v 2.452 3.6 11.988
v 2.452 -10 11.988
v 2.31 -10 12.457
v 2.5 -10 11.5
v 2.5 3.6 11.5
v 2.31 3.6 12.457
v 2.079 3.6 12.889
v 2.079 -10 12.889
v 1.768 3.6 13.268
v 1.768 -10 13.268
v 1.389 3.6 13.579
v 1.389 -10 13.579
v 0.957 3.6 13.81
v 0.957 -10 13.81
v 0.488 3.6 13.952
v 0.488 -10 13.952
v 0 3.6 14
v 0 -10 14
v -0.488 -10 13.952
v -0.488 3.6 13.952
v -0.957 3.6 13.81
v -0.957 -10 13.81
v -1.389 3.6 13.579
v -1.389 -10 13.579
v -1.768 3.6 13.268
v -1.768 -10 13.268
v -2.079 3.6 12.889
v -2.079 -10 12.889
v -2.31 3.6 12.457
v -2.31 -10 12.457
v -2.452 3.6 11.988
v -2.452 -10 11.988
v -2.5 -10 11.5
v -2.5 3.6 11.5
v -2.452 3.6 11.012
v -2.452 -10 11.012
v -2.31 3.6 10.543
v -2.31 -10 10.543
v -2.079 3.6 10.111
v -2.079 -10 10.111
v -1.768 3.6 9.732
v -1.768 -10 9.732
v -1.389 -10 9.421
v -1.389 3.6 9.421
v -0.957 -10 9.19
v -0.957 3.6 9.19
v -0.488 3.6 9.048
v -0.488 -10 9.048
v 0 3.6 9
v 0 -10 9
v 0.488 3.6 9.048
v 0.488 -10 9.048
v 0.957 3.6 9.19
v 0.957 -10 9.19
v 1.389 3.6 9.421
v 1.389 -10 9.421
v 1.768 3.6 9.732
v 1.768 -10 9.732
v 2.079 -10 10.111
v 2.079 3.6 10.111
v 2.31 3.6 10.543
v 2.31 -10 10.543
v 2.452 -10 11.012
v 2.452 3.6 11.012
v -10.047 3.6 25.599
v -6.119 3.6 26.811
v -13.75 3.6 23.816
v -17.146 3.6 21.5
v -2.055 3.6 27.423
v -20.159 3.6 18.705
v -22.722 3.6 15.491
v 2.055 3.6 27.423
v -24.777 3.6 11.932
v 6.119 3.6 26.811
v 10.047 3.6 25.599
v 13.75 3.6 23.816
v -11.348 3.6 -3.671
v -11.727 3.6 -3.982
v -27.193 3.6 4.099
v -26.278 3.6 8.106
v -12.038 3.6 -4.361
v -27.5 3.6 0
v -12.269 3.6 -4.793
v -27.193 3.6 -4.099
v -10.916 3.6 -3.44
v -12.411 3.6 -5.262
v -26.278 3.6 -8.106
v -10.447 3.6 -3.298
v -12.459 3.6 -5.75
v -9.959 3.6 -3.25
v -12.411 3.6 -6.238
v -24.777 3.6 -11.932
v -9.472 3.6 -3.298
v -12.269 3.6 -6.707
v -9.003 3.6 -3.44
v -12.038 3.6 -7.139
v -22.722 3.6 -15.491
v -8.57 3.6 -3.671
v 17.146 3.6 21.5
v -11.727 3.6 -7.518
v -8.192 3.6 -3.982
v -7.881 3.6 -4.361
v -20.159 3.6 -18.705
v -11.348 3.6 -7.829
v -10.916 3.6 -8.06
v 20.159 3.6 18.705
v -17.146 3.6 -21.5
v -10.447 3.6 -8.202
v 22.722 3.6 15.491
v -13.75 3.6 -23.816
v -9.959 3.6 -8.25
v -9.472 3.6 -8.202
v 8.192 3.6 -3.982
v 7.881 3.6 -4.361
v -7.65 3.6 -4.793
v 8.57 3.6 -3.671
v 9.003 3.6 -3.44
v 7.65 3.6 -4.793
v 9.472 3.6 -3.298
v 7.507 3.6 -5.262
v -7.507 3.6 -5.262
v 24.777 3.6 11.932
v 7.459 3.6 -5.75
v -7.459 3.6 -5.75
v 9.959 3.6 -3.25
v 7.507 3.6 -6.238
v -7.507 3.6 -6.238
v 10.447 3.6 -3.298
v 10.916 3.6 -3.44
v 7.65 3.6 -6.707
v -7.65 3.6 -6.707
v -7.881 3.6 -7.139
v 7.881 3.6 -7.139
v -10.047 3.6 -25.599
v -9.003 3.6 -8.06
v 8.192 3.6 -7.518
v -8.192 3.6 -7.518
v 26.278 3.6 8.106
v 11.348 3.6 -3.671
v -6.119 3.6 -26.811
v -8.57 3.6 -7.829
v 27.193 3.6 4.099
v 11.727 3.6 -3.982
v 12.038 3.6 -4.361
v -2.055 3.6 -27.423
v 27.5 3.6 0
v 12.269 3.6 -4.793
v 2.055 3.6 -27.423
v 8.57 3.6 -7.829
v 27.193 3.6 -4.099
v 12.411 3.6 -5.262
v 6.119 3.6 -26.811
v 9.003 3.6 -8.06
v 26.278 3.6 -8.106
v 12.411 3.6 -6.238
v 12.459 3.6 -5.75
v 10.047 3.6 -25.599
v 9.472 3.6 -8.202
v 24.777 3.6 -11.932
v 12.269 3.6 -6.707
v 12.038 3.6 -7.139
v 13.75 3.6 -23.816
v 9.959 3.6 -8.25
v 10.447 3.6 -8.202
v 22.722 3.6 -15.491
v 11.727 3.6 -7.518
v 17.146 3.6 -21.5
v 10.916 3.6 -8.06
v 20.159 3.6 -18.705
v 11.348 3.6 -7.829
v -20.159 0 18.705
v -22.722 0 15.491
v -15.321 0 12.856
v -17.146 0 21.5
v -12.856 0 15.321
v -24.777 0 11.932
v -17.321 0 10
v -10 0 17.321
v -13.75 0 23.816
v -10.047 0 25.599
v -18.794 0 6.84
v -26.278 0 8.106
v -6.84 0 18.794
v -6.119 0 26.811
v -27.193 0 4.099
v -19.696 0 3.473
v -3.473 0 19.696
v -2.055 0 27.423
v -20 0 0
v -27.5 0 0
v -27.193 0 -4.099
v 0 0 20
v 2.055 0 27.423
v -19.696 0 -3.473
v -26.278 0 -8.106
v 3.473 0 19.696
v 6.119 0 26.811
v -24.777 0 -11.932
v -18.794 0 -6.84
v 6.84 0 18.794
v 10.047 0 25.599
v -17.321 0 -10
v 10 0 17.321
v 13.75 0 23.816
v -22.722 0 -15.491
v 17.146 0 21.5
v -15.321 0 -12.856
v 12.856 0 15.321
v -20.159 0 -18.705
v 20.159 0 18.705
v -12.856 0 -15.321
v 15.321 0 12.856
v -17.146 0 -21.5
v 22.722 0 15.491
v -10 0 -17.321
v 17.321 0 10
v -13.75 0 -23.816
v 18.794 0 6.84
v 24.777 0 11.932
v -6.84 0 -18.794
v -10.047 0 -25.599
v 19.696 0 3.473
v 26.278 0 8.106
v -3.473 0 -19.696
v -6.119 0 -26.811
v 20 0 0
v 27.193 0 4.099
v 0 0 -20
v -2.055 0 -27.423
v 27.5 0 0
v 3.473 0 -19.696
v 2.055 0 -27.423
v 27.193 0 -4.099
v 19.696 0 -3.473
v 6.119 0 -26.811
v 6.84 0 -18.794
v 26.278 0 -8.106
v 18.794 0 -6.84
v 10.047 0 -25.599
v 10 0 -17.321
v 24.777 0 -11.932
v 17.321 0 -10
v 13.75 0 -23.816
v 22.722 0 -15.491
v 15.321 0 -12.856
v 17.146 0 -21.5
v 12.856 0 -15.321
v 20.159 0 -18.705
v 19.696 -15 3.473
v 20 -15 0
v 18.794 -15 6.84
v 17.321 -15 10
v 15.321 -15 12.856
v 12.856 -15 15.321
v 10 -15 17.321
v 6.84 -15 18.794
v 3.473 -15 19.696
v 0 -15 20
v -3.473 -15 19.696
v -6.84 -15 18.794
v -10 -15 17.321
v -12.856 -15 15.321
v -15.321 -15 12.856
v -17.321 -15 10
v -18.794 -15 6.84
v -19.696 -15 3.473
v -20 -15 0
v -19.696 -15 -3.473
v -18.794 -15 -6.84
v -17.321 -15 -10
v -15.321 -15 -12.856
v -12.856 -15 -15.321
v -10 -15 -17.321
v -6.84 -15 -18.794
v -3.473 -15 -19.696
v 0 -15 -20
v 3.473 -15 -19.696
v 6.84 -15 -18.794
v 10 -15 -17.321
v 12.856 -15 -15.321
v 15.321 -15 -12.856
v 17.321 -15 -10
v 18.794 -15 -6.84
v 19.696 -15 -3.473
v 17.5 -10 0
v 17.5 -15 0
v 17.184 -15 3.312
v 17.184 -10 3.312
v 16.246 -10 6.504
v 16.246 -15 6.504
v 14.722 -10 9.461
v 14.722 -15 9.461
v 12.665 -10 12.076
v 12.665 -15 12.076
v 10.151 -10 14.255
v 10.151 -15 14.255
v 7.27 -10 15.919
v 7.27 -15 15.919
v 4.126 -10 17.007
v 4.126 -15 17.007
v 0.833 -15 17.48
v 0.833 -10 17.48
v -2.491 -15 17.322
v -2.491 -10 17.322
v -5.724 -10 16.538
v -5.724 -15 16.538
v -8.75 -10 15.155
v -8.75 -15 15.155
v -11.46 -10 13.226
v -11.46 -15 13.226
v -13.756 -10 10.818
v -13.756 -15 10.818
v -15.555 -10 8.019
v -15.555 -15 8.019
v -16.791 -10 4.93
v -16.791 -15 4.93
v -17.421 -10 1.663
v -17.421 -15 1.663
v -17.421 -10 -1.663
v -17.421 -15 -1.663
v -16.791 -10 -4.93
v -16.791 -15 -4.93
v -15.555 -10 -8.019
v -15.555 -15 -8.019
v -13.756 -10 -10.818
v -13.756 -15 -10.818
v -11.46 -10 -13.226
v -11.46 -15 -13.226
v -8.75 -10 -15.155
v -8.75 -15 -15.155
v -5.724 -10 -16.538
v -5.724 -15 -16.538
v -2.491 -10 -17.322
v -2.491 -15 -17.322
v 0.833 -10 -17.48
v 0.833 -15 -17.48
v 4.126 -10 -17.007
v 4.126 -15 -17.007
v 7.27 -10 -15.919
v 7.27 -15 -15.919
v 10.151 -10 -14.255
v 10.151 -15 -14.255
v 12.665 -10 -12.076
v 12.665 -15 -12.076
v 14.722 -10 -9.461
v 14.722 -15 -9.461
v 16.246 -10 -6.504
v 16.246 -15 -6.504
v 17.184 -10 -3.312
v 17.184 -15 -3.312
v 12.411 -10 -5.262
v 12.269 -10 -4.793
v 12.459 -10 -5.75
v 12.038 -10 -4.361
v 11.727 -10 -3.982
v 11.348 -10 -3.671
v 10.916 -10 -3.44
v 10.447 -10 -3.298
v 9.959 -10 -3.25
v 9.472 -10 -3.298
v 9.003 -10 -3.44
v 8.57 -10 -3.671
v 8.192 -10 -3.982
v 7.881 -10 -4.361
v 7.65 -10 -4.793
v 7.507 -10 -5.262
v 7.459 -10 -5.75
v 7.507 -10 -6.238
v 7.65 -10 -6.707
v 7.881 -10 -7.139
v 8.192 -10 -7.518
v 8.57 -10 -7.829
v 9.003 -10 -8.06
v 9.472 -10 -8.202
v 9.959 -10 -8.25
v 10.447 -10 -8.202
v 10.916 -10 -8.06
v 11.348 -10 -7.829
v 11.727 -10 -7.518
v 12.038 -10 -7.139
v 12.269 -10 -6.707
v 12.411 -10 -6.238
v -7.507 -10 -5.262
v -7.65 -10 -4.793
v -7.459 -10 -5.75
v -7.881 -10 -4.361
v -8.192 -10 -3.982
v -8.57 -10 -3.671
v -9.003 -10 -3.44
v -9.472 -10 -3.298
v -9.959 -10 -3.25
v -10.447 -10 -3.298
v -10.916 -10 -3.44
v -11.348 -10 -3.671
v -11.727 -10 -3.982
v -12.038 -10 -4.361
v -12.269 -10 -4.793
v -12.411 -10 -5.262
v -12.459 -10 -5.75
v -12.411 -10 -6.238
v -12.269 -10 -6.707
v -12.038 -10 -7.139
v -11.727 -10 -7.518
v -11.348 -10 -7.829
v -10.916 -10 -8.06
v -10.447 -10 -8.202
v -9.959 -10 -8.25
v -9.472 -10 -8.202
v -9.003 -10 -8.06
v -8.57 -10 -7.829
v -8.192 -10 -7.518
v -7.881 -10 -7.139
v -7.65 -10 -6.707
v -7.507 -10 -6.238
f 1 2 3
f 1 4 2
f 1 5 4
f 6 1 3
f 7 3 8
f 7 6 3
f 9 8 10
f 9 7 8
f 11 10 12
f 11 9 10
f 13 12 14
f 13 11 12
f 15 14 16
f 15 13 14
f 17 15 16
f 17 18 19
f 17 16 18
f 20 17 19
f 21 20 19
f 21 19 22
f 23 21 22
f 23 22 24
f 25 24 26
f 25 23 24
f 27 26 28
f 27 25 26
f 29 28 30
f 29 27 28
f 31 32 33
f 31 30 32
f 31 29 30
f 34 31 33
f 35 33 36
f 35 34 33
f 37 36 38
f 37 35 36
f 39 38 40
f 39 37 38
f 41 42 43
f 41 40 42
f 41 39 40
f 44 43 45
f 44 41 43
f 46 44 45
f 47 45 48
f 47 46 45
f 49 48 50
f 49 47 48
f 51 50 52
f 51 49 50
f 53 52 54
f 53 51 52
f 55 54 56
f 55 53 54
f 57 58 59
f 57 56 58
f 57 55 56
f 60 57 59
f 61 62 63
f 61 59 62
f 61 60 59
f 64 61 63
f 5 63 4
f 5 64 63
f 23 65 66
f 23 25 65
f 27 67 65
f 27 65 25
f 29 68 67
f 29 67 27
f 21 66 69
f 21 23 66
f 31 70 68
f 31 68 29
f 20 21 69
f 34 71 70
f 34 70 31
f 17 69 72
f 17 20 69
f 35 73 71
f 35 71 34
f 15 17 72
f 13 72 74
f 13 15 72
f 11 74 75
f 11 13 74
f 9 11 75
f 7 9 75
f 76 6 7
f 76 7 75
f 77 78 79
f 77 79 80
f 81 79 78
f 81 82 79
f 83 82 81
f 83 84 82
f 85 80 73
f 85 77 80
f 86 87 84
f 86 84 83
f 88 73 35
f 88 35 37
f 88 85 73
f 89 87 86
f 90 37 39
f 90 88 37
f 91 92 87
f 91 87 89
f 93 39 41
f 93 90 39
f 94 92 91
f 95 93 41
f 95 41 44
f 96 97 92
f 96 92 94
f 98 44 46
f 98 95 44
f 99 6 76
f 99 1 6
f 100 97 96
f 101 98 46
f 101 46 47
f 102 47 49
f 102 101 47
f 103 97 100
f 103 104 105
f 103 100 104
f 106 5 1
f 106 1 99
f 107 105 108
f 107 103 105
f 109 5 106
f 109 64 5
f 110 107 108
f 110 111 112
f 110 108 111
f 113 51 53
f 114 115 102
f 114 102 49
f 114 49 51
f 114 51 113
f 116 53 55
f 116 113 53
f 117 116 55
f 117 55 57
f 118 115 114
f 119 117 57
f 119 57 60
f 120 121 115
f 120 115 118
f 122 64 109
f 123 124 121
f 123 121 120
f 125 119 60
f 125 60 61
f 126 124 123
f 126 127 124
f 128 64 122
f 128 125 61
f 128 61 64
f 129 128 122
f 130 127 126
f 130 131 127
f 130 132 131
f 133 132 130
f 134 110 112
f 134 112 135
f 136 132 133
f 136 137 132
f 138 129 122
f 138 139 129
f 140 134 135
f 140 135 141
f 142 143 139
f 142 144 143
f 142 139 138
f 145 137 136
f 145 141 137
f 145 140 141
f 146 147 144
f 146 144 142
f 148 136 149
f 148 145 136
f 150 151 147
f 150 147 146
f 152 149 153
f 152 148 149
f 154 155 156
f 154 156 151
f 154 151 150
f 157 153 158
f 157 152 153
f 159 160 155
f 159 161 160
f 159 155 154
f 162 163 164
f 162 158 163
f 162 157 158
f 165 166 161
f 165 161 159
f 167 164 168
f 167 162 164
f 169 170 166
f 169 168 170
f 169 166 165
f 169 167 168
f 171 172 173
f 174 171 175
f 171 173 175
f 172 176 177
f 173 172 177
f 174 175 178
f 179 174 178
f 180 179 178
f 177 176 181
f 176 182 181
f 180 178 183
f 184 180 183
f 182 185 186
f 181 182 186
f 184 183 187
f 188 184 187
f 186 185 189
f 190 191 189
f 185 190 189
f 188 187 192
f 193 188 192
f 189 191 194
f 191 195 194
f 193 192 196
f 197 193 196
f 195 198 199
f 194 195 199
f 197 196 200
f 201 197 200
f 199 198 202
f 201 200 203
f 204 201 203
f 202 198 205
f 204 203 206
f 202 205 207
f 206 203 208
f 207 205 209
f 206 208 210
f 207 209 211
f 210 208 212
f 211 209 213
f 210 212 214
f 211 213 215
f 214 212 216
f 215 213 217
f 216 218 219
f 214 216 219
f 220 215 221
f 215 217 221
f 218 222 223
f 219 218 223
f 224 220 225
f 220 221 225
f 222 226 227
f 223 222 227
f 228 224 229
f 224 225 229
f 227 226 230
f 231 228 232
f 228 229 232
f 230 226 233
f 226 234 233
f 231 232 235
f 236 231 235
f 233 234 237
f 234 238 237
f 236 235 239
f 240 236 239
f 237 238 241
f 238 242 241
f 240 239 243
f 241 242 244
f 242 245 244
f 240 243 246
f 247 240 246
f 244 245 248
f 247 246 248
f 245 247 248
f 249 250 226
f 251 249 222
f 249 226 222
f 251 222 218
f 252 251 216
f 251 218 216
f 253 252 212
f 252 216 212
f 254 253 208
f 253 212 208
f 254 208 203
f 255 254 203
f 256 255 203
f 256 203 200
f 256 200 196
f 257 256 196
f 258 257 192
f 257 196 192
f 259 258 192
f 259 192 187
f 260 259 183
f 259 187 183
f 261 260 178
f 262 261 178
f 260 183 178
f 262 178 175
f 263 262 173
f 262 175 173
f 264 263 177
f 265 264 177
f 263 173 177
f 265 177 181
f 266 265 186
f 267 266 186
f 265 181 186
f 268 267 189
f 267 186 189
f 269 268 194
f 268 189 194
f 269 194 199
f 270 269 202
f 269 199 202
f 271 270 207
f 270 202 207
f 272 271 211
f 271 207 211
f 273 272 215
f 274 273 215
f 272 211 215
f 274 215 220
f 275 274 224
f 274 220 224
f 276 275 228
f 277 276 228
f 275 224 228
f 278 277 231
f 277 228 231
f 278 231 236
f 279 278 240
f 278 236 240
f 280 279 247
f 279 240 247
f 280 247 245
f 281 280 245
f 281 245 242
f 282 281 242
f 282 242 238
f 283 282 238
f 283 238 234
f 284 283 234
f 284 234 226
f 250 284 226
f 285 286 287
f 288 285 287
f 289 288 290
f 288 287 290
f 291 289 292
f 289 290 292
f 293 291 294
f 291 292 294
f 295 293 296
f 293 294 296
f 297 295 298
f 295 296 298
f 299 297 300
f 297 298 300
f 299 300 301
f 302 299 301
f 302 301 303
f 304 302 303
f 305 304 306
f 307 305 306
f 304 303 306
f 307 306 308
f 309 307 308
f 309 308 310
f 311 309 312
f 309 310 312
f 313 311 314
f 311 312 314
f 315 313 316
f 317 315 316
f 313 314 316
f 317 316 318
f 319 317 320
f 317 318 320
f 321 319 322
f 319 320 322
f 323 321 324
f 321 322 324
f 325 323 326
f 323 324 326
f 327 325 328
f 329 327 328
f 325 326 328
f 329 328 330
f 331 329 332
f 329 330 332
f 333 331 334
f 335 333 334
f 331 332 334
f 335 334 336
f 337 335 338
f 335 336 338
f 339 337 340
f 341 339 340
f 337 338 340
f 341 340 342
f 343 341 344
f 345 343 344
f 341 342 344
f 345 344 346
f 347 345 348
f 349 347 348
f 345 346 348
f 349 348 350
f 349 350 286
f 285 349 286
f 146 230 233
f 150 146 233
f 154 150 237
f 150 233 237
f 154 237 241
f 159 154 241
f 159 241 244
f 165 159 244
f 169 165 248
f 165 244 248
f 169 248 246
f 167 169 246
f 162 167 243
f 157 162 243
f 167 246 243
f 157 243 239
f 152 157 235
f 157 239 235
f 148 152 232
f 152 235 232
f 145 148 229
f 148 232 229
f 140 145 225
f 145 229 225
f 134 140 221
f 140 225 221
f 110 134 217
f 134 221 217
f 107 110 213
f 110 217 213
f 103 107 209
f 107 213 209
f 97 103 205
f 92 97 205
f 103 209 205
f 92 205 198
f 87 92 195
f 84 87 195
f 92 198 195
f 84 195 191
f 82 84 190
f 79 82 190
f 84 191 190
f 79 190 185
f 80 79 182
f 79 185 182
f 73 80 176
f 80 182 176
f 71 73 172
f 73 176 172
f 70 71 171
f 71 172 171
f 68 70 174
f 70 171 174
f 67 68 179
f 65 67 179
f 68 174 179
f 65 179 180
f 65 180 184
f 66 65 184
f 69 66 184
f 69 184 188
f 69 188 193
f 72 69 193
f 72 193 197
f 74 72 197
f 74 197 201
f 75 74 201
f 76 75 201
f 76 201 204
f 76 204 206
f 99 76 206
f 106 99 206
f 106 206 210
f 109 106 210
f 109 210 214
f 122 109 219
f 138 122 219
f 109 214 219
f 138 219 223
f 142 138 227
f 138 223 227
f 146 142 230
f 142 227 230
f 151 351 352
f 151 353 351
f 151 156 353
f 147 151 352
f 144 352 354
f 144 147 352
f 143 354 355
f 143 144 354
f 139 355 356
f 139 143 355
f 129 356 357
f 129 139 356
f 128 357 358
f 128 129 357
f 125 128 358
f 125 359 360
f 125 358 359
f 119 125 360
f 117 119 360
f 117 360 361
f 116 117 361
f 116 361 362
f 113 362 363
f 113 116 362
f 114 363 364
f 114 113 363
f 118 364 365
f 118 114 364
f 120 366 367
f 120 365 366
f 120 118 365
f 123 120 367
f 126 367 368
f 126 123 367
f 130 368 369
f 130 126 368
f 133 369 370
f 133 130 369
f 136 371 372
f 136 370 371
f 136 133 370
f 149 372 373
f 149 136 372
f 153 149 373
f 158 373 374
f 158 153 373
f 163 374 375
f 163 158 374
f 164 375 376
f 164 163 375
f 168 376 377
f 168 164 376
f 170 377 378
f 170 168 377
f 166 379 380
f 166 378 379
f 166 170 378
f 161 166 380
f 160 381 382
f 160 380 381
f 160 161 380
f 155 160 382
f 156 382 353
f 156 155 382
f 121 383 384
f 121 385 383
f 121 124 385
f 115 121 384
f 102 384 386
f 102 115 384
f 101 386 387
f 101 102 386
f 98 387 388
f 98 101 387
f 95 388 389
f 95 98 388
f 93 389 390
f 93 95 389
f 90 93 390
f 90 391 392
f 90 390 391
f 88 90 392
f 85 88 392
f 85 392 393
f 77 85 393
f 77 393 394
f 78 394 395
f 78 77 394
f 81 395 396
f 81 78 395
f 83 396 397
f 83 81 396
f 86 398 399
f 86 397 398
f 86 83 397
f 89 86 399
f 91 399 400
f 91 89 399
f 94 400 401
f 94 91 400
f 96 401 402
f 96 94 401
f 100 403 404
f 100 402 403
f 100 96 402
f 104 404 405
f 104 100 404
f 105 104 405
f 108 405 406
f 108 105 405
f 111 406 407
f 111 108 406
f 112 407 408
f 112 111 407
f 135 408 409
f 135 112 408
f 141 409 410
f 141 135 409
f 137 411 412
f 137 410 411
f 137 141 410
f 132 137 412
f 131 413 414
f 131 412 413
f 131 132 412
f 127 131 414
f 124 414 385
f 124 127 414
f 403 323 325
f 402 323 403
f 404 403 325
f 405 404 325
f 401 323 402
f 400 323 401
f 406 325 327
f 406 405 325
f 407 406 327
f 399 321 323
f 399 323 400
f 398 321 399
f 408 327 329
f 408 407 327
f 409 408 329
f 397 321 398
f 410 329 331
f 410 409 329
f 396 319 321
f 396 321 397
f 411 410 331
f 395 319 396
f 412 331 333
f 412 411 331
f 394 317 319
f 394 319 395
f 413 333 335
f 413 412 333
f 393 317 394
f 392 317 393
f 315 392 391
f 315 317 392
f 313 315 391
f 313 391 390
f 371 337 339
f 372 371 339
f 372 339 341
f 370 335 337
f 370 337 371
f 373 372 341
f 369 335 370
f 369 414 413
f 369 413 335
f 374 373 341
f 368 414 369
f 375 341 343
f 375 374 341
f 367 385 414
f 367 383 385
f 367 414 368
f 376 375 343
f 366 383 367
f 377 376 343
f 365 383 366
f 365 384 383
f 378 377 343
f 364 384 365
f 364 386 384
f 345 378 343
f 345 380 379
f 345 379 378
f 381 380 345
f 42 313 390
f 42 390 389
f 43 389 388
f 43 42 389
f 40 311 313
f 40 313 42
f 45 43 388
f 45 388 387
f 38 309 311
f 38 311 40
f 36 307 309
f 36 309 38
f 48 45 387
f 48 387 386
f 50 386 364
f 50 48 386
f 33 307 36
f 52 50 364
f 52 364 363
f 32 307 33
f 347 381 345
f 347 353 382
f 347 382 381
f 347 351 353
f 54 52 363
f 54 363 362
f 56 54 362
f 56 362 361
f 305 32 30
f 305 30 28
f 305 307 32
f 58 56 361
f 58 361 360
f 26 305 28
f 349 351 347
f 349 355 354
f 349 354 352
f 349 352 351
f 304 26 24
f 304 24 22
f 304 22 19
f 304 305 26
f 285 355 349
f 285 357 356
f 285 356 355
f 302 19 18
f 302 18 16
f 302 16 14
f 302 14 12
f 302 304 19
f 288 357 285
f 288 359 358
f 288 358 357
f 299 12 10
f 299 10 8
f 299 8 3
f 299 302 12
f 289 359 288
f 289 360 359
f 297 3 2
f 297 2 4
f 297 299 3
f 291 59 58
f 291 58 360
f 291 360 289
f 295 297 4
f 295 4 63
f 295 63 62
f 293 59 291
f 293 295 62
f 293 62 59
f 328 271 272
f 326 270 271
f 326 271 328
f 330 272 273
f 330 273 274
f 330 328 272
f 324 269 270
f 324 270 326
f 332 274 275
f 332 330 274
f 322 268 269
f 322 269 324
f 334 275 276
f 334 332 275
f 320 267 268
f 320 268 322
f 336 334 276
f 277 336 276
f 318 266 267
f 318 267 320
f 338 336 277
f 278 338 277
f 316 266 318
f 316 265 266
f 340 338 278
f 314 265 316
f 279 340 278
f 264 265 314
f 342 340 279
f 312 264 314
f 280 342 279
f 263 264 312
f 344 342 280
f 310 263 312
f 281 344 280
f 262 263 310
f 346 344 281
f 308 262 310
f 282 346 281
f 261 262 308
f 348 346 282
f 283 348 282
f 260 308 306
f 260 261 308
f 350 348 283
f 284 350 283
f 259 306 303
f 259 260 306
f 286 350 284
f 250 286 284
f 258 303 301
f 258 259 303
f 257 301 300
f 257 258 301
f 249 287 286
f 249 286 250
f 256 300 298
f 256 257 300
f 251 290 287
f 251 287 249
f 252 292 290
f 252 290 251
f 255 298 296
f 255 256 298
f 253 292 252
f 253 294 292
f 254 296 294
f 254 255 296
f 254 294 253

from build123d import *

# Parameters (mm, degrees)
SKETCH1_R           = 27.5
SKETCH1_R_2         = 2.5
BOSS_EXTRUDE1_DEPTH = 3.6
SKETCH2_R           = 20
SKETCH2_R_2         = 2.5
BOSS_EXTRUDE2_DEPTH = 15
SKETCH3_R           = 17.5
CUT_EXTRUDE1_DEPTH  = 5


with BuildPart() as part:
    # Sketch1 → Boss-Extrude1 (new body)
    with BuildSketch(Plane(origin=(0, 0, 0), x_dir=(1, 0, 0), z_dir=(0, 1, 0))):
        Circle(SKETCH1_R)
        with Locations((-9.959292144, 5.75)):
            Circle(SKETCH1_R_2, mode=Mode.SUBTRACT)
        with Locations((9.959292144, 5.75)):
            Circle(SKETCH1_R_2, mode=Mode.SUBTRACT)
        with Locations((0, -11.5)):
            Circle(SKETCH1_R_2, mode=Mode.SUBTRACT)
    extrude(amount=BOSS_EXTRUDE1_DEPTH)

    # Sketch2 → Boss-Extrude2 (add)
    with BuildSketch(Plane.XZ):
        Circle(SKETCH2_R)
        with Locations((0, 11.5)):
            Circle(SKETCH2_R_2, mode=Mode.SUBTRACT)
        with Locations((9.959292144, -5.75)):
            Circle(SKETCH2_R_2, mode=Mode.SUBTRACT)
        with Locations((-9.959292144, -5.75)):
            Circle(SKETCH2_R_2, mode=Mode.SUBTRACT)
    extrude(amount=BOSS_EXTRUDE2_DEPTH)

    # Sketch3 → Cut-Extrude1 (cut)
    with BuildSketch(Plane.XZ.offset(15)):
        Circle(SKETCH3_R)
    extrude(amount=-CUT_EXTRUDE1_DEPTH, mode=Mode.SUBTRACT)


solid = part.part
